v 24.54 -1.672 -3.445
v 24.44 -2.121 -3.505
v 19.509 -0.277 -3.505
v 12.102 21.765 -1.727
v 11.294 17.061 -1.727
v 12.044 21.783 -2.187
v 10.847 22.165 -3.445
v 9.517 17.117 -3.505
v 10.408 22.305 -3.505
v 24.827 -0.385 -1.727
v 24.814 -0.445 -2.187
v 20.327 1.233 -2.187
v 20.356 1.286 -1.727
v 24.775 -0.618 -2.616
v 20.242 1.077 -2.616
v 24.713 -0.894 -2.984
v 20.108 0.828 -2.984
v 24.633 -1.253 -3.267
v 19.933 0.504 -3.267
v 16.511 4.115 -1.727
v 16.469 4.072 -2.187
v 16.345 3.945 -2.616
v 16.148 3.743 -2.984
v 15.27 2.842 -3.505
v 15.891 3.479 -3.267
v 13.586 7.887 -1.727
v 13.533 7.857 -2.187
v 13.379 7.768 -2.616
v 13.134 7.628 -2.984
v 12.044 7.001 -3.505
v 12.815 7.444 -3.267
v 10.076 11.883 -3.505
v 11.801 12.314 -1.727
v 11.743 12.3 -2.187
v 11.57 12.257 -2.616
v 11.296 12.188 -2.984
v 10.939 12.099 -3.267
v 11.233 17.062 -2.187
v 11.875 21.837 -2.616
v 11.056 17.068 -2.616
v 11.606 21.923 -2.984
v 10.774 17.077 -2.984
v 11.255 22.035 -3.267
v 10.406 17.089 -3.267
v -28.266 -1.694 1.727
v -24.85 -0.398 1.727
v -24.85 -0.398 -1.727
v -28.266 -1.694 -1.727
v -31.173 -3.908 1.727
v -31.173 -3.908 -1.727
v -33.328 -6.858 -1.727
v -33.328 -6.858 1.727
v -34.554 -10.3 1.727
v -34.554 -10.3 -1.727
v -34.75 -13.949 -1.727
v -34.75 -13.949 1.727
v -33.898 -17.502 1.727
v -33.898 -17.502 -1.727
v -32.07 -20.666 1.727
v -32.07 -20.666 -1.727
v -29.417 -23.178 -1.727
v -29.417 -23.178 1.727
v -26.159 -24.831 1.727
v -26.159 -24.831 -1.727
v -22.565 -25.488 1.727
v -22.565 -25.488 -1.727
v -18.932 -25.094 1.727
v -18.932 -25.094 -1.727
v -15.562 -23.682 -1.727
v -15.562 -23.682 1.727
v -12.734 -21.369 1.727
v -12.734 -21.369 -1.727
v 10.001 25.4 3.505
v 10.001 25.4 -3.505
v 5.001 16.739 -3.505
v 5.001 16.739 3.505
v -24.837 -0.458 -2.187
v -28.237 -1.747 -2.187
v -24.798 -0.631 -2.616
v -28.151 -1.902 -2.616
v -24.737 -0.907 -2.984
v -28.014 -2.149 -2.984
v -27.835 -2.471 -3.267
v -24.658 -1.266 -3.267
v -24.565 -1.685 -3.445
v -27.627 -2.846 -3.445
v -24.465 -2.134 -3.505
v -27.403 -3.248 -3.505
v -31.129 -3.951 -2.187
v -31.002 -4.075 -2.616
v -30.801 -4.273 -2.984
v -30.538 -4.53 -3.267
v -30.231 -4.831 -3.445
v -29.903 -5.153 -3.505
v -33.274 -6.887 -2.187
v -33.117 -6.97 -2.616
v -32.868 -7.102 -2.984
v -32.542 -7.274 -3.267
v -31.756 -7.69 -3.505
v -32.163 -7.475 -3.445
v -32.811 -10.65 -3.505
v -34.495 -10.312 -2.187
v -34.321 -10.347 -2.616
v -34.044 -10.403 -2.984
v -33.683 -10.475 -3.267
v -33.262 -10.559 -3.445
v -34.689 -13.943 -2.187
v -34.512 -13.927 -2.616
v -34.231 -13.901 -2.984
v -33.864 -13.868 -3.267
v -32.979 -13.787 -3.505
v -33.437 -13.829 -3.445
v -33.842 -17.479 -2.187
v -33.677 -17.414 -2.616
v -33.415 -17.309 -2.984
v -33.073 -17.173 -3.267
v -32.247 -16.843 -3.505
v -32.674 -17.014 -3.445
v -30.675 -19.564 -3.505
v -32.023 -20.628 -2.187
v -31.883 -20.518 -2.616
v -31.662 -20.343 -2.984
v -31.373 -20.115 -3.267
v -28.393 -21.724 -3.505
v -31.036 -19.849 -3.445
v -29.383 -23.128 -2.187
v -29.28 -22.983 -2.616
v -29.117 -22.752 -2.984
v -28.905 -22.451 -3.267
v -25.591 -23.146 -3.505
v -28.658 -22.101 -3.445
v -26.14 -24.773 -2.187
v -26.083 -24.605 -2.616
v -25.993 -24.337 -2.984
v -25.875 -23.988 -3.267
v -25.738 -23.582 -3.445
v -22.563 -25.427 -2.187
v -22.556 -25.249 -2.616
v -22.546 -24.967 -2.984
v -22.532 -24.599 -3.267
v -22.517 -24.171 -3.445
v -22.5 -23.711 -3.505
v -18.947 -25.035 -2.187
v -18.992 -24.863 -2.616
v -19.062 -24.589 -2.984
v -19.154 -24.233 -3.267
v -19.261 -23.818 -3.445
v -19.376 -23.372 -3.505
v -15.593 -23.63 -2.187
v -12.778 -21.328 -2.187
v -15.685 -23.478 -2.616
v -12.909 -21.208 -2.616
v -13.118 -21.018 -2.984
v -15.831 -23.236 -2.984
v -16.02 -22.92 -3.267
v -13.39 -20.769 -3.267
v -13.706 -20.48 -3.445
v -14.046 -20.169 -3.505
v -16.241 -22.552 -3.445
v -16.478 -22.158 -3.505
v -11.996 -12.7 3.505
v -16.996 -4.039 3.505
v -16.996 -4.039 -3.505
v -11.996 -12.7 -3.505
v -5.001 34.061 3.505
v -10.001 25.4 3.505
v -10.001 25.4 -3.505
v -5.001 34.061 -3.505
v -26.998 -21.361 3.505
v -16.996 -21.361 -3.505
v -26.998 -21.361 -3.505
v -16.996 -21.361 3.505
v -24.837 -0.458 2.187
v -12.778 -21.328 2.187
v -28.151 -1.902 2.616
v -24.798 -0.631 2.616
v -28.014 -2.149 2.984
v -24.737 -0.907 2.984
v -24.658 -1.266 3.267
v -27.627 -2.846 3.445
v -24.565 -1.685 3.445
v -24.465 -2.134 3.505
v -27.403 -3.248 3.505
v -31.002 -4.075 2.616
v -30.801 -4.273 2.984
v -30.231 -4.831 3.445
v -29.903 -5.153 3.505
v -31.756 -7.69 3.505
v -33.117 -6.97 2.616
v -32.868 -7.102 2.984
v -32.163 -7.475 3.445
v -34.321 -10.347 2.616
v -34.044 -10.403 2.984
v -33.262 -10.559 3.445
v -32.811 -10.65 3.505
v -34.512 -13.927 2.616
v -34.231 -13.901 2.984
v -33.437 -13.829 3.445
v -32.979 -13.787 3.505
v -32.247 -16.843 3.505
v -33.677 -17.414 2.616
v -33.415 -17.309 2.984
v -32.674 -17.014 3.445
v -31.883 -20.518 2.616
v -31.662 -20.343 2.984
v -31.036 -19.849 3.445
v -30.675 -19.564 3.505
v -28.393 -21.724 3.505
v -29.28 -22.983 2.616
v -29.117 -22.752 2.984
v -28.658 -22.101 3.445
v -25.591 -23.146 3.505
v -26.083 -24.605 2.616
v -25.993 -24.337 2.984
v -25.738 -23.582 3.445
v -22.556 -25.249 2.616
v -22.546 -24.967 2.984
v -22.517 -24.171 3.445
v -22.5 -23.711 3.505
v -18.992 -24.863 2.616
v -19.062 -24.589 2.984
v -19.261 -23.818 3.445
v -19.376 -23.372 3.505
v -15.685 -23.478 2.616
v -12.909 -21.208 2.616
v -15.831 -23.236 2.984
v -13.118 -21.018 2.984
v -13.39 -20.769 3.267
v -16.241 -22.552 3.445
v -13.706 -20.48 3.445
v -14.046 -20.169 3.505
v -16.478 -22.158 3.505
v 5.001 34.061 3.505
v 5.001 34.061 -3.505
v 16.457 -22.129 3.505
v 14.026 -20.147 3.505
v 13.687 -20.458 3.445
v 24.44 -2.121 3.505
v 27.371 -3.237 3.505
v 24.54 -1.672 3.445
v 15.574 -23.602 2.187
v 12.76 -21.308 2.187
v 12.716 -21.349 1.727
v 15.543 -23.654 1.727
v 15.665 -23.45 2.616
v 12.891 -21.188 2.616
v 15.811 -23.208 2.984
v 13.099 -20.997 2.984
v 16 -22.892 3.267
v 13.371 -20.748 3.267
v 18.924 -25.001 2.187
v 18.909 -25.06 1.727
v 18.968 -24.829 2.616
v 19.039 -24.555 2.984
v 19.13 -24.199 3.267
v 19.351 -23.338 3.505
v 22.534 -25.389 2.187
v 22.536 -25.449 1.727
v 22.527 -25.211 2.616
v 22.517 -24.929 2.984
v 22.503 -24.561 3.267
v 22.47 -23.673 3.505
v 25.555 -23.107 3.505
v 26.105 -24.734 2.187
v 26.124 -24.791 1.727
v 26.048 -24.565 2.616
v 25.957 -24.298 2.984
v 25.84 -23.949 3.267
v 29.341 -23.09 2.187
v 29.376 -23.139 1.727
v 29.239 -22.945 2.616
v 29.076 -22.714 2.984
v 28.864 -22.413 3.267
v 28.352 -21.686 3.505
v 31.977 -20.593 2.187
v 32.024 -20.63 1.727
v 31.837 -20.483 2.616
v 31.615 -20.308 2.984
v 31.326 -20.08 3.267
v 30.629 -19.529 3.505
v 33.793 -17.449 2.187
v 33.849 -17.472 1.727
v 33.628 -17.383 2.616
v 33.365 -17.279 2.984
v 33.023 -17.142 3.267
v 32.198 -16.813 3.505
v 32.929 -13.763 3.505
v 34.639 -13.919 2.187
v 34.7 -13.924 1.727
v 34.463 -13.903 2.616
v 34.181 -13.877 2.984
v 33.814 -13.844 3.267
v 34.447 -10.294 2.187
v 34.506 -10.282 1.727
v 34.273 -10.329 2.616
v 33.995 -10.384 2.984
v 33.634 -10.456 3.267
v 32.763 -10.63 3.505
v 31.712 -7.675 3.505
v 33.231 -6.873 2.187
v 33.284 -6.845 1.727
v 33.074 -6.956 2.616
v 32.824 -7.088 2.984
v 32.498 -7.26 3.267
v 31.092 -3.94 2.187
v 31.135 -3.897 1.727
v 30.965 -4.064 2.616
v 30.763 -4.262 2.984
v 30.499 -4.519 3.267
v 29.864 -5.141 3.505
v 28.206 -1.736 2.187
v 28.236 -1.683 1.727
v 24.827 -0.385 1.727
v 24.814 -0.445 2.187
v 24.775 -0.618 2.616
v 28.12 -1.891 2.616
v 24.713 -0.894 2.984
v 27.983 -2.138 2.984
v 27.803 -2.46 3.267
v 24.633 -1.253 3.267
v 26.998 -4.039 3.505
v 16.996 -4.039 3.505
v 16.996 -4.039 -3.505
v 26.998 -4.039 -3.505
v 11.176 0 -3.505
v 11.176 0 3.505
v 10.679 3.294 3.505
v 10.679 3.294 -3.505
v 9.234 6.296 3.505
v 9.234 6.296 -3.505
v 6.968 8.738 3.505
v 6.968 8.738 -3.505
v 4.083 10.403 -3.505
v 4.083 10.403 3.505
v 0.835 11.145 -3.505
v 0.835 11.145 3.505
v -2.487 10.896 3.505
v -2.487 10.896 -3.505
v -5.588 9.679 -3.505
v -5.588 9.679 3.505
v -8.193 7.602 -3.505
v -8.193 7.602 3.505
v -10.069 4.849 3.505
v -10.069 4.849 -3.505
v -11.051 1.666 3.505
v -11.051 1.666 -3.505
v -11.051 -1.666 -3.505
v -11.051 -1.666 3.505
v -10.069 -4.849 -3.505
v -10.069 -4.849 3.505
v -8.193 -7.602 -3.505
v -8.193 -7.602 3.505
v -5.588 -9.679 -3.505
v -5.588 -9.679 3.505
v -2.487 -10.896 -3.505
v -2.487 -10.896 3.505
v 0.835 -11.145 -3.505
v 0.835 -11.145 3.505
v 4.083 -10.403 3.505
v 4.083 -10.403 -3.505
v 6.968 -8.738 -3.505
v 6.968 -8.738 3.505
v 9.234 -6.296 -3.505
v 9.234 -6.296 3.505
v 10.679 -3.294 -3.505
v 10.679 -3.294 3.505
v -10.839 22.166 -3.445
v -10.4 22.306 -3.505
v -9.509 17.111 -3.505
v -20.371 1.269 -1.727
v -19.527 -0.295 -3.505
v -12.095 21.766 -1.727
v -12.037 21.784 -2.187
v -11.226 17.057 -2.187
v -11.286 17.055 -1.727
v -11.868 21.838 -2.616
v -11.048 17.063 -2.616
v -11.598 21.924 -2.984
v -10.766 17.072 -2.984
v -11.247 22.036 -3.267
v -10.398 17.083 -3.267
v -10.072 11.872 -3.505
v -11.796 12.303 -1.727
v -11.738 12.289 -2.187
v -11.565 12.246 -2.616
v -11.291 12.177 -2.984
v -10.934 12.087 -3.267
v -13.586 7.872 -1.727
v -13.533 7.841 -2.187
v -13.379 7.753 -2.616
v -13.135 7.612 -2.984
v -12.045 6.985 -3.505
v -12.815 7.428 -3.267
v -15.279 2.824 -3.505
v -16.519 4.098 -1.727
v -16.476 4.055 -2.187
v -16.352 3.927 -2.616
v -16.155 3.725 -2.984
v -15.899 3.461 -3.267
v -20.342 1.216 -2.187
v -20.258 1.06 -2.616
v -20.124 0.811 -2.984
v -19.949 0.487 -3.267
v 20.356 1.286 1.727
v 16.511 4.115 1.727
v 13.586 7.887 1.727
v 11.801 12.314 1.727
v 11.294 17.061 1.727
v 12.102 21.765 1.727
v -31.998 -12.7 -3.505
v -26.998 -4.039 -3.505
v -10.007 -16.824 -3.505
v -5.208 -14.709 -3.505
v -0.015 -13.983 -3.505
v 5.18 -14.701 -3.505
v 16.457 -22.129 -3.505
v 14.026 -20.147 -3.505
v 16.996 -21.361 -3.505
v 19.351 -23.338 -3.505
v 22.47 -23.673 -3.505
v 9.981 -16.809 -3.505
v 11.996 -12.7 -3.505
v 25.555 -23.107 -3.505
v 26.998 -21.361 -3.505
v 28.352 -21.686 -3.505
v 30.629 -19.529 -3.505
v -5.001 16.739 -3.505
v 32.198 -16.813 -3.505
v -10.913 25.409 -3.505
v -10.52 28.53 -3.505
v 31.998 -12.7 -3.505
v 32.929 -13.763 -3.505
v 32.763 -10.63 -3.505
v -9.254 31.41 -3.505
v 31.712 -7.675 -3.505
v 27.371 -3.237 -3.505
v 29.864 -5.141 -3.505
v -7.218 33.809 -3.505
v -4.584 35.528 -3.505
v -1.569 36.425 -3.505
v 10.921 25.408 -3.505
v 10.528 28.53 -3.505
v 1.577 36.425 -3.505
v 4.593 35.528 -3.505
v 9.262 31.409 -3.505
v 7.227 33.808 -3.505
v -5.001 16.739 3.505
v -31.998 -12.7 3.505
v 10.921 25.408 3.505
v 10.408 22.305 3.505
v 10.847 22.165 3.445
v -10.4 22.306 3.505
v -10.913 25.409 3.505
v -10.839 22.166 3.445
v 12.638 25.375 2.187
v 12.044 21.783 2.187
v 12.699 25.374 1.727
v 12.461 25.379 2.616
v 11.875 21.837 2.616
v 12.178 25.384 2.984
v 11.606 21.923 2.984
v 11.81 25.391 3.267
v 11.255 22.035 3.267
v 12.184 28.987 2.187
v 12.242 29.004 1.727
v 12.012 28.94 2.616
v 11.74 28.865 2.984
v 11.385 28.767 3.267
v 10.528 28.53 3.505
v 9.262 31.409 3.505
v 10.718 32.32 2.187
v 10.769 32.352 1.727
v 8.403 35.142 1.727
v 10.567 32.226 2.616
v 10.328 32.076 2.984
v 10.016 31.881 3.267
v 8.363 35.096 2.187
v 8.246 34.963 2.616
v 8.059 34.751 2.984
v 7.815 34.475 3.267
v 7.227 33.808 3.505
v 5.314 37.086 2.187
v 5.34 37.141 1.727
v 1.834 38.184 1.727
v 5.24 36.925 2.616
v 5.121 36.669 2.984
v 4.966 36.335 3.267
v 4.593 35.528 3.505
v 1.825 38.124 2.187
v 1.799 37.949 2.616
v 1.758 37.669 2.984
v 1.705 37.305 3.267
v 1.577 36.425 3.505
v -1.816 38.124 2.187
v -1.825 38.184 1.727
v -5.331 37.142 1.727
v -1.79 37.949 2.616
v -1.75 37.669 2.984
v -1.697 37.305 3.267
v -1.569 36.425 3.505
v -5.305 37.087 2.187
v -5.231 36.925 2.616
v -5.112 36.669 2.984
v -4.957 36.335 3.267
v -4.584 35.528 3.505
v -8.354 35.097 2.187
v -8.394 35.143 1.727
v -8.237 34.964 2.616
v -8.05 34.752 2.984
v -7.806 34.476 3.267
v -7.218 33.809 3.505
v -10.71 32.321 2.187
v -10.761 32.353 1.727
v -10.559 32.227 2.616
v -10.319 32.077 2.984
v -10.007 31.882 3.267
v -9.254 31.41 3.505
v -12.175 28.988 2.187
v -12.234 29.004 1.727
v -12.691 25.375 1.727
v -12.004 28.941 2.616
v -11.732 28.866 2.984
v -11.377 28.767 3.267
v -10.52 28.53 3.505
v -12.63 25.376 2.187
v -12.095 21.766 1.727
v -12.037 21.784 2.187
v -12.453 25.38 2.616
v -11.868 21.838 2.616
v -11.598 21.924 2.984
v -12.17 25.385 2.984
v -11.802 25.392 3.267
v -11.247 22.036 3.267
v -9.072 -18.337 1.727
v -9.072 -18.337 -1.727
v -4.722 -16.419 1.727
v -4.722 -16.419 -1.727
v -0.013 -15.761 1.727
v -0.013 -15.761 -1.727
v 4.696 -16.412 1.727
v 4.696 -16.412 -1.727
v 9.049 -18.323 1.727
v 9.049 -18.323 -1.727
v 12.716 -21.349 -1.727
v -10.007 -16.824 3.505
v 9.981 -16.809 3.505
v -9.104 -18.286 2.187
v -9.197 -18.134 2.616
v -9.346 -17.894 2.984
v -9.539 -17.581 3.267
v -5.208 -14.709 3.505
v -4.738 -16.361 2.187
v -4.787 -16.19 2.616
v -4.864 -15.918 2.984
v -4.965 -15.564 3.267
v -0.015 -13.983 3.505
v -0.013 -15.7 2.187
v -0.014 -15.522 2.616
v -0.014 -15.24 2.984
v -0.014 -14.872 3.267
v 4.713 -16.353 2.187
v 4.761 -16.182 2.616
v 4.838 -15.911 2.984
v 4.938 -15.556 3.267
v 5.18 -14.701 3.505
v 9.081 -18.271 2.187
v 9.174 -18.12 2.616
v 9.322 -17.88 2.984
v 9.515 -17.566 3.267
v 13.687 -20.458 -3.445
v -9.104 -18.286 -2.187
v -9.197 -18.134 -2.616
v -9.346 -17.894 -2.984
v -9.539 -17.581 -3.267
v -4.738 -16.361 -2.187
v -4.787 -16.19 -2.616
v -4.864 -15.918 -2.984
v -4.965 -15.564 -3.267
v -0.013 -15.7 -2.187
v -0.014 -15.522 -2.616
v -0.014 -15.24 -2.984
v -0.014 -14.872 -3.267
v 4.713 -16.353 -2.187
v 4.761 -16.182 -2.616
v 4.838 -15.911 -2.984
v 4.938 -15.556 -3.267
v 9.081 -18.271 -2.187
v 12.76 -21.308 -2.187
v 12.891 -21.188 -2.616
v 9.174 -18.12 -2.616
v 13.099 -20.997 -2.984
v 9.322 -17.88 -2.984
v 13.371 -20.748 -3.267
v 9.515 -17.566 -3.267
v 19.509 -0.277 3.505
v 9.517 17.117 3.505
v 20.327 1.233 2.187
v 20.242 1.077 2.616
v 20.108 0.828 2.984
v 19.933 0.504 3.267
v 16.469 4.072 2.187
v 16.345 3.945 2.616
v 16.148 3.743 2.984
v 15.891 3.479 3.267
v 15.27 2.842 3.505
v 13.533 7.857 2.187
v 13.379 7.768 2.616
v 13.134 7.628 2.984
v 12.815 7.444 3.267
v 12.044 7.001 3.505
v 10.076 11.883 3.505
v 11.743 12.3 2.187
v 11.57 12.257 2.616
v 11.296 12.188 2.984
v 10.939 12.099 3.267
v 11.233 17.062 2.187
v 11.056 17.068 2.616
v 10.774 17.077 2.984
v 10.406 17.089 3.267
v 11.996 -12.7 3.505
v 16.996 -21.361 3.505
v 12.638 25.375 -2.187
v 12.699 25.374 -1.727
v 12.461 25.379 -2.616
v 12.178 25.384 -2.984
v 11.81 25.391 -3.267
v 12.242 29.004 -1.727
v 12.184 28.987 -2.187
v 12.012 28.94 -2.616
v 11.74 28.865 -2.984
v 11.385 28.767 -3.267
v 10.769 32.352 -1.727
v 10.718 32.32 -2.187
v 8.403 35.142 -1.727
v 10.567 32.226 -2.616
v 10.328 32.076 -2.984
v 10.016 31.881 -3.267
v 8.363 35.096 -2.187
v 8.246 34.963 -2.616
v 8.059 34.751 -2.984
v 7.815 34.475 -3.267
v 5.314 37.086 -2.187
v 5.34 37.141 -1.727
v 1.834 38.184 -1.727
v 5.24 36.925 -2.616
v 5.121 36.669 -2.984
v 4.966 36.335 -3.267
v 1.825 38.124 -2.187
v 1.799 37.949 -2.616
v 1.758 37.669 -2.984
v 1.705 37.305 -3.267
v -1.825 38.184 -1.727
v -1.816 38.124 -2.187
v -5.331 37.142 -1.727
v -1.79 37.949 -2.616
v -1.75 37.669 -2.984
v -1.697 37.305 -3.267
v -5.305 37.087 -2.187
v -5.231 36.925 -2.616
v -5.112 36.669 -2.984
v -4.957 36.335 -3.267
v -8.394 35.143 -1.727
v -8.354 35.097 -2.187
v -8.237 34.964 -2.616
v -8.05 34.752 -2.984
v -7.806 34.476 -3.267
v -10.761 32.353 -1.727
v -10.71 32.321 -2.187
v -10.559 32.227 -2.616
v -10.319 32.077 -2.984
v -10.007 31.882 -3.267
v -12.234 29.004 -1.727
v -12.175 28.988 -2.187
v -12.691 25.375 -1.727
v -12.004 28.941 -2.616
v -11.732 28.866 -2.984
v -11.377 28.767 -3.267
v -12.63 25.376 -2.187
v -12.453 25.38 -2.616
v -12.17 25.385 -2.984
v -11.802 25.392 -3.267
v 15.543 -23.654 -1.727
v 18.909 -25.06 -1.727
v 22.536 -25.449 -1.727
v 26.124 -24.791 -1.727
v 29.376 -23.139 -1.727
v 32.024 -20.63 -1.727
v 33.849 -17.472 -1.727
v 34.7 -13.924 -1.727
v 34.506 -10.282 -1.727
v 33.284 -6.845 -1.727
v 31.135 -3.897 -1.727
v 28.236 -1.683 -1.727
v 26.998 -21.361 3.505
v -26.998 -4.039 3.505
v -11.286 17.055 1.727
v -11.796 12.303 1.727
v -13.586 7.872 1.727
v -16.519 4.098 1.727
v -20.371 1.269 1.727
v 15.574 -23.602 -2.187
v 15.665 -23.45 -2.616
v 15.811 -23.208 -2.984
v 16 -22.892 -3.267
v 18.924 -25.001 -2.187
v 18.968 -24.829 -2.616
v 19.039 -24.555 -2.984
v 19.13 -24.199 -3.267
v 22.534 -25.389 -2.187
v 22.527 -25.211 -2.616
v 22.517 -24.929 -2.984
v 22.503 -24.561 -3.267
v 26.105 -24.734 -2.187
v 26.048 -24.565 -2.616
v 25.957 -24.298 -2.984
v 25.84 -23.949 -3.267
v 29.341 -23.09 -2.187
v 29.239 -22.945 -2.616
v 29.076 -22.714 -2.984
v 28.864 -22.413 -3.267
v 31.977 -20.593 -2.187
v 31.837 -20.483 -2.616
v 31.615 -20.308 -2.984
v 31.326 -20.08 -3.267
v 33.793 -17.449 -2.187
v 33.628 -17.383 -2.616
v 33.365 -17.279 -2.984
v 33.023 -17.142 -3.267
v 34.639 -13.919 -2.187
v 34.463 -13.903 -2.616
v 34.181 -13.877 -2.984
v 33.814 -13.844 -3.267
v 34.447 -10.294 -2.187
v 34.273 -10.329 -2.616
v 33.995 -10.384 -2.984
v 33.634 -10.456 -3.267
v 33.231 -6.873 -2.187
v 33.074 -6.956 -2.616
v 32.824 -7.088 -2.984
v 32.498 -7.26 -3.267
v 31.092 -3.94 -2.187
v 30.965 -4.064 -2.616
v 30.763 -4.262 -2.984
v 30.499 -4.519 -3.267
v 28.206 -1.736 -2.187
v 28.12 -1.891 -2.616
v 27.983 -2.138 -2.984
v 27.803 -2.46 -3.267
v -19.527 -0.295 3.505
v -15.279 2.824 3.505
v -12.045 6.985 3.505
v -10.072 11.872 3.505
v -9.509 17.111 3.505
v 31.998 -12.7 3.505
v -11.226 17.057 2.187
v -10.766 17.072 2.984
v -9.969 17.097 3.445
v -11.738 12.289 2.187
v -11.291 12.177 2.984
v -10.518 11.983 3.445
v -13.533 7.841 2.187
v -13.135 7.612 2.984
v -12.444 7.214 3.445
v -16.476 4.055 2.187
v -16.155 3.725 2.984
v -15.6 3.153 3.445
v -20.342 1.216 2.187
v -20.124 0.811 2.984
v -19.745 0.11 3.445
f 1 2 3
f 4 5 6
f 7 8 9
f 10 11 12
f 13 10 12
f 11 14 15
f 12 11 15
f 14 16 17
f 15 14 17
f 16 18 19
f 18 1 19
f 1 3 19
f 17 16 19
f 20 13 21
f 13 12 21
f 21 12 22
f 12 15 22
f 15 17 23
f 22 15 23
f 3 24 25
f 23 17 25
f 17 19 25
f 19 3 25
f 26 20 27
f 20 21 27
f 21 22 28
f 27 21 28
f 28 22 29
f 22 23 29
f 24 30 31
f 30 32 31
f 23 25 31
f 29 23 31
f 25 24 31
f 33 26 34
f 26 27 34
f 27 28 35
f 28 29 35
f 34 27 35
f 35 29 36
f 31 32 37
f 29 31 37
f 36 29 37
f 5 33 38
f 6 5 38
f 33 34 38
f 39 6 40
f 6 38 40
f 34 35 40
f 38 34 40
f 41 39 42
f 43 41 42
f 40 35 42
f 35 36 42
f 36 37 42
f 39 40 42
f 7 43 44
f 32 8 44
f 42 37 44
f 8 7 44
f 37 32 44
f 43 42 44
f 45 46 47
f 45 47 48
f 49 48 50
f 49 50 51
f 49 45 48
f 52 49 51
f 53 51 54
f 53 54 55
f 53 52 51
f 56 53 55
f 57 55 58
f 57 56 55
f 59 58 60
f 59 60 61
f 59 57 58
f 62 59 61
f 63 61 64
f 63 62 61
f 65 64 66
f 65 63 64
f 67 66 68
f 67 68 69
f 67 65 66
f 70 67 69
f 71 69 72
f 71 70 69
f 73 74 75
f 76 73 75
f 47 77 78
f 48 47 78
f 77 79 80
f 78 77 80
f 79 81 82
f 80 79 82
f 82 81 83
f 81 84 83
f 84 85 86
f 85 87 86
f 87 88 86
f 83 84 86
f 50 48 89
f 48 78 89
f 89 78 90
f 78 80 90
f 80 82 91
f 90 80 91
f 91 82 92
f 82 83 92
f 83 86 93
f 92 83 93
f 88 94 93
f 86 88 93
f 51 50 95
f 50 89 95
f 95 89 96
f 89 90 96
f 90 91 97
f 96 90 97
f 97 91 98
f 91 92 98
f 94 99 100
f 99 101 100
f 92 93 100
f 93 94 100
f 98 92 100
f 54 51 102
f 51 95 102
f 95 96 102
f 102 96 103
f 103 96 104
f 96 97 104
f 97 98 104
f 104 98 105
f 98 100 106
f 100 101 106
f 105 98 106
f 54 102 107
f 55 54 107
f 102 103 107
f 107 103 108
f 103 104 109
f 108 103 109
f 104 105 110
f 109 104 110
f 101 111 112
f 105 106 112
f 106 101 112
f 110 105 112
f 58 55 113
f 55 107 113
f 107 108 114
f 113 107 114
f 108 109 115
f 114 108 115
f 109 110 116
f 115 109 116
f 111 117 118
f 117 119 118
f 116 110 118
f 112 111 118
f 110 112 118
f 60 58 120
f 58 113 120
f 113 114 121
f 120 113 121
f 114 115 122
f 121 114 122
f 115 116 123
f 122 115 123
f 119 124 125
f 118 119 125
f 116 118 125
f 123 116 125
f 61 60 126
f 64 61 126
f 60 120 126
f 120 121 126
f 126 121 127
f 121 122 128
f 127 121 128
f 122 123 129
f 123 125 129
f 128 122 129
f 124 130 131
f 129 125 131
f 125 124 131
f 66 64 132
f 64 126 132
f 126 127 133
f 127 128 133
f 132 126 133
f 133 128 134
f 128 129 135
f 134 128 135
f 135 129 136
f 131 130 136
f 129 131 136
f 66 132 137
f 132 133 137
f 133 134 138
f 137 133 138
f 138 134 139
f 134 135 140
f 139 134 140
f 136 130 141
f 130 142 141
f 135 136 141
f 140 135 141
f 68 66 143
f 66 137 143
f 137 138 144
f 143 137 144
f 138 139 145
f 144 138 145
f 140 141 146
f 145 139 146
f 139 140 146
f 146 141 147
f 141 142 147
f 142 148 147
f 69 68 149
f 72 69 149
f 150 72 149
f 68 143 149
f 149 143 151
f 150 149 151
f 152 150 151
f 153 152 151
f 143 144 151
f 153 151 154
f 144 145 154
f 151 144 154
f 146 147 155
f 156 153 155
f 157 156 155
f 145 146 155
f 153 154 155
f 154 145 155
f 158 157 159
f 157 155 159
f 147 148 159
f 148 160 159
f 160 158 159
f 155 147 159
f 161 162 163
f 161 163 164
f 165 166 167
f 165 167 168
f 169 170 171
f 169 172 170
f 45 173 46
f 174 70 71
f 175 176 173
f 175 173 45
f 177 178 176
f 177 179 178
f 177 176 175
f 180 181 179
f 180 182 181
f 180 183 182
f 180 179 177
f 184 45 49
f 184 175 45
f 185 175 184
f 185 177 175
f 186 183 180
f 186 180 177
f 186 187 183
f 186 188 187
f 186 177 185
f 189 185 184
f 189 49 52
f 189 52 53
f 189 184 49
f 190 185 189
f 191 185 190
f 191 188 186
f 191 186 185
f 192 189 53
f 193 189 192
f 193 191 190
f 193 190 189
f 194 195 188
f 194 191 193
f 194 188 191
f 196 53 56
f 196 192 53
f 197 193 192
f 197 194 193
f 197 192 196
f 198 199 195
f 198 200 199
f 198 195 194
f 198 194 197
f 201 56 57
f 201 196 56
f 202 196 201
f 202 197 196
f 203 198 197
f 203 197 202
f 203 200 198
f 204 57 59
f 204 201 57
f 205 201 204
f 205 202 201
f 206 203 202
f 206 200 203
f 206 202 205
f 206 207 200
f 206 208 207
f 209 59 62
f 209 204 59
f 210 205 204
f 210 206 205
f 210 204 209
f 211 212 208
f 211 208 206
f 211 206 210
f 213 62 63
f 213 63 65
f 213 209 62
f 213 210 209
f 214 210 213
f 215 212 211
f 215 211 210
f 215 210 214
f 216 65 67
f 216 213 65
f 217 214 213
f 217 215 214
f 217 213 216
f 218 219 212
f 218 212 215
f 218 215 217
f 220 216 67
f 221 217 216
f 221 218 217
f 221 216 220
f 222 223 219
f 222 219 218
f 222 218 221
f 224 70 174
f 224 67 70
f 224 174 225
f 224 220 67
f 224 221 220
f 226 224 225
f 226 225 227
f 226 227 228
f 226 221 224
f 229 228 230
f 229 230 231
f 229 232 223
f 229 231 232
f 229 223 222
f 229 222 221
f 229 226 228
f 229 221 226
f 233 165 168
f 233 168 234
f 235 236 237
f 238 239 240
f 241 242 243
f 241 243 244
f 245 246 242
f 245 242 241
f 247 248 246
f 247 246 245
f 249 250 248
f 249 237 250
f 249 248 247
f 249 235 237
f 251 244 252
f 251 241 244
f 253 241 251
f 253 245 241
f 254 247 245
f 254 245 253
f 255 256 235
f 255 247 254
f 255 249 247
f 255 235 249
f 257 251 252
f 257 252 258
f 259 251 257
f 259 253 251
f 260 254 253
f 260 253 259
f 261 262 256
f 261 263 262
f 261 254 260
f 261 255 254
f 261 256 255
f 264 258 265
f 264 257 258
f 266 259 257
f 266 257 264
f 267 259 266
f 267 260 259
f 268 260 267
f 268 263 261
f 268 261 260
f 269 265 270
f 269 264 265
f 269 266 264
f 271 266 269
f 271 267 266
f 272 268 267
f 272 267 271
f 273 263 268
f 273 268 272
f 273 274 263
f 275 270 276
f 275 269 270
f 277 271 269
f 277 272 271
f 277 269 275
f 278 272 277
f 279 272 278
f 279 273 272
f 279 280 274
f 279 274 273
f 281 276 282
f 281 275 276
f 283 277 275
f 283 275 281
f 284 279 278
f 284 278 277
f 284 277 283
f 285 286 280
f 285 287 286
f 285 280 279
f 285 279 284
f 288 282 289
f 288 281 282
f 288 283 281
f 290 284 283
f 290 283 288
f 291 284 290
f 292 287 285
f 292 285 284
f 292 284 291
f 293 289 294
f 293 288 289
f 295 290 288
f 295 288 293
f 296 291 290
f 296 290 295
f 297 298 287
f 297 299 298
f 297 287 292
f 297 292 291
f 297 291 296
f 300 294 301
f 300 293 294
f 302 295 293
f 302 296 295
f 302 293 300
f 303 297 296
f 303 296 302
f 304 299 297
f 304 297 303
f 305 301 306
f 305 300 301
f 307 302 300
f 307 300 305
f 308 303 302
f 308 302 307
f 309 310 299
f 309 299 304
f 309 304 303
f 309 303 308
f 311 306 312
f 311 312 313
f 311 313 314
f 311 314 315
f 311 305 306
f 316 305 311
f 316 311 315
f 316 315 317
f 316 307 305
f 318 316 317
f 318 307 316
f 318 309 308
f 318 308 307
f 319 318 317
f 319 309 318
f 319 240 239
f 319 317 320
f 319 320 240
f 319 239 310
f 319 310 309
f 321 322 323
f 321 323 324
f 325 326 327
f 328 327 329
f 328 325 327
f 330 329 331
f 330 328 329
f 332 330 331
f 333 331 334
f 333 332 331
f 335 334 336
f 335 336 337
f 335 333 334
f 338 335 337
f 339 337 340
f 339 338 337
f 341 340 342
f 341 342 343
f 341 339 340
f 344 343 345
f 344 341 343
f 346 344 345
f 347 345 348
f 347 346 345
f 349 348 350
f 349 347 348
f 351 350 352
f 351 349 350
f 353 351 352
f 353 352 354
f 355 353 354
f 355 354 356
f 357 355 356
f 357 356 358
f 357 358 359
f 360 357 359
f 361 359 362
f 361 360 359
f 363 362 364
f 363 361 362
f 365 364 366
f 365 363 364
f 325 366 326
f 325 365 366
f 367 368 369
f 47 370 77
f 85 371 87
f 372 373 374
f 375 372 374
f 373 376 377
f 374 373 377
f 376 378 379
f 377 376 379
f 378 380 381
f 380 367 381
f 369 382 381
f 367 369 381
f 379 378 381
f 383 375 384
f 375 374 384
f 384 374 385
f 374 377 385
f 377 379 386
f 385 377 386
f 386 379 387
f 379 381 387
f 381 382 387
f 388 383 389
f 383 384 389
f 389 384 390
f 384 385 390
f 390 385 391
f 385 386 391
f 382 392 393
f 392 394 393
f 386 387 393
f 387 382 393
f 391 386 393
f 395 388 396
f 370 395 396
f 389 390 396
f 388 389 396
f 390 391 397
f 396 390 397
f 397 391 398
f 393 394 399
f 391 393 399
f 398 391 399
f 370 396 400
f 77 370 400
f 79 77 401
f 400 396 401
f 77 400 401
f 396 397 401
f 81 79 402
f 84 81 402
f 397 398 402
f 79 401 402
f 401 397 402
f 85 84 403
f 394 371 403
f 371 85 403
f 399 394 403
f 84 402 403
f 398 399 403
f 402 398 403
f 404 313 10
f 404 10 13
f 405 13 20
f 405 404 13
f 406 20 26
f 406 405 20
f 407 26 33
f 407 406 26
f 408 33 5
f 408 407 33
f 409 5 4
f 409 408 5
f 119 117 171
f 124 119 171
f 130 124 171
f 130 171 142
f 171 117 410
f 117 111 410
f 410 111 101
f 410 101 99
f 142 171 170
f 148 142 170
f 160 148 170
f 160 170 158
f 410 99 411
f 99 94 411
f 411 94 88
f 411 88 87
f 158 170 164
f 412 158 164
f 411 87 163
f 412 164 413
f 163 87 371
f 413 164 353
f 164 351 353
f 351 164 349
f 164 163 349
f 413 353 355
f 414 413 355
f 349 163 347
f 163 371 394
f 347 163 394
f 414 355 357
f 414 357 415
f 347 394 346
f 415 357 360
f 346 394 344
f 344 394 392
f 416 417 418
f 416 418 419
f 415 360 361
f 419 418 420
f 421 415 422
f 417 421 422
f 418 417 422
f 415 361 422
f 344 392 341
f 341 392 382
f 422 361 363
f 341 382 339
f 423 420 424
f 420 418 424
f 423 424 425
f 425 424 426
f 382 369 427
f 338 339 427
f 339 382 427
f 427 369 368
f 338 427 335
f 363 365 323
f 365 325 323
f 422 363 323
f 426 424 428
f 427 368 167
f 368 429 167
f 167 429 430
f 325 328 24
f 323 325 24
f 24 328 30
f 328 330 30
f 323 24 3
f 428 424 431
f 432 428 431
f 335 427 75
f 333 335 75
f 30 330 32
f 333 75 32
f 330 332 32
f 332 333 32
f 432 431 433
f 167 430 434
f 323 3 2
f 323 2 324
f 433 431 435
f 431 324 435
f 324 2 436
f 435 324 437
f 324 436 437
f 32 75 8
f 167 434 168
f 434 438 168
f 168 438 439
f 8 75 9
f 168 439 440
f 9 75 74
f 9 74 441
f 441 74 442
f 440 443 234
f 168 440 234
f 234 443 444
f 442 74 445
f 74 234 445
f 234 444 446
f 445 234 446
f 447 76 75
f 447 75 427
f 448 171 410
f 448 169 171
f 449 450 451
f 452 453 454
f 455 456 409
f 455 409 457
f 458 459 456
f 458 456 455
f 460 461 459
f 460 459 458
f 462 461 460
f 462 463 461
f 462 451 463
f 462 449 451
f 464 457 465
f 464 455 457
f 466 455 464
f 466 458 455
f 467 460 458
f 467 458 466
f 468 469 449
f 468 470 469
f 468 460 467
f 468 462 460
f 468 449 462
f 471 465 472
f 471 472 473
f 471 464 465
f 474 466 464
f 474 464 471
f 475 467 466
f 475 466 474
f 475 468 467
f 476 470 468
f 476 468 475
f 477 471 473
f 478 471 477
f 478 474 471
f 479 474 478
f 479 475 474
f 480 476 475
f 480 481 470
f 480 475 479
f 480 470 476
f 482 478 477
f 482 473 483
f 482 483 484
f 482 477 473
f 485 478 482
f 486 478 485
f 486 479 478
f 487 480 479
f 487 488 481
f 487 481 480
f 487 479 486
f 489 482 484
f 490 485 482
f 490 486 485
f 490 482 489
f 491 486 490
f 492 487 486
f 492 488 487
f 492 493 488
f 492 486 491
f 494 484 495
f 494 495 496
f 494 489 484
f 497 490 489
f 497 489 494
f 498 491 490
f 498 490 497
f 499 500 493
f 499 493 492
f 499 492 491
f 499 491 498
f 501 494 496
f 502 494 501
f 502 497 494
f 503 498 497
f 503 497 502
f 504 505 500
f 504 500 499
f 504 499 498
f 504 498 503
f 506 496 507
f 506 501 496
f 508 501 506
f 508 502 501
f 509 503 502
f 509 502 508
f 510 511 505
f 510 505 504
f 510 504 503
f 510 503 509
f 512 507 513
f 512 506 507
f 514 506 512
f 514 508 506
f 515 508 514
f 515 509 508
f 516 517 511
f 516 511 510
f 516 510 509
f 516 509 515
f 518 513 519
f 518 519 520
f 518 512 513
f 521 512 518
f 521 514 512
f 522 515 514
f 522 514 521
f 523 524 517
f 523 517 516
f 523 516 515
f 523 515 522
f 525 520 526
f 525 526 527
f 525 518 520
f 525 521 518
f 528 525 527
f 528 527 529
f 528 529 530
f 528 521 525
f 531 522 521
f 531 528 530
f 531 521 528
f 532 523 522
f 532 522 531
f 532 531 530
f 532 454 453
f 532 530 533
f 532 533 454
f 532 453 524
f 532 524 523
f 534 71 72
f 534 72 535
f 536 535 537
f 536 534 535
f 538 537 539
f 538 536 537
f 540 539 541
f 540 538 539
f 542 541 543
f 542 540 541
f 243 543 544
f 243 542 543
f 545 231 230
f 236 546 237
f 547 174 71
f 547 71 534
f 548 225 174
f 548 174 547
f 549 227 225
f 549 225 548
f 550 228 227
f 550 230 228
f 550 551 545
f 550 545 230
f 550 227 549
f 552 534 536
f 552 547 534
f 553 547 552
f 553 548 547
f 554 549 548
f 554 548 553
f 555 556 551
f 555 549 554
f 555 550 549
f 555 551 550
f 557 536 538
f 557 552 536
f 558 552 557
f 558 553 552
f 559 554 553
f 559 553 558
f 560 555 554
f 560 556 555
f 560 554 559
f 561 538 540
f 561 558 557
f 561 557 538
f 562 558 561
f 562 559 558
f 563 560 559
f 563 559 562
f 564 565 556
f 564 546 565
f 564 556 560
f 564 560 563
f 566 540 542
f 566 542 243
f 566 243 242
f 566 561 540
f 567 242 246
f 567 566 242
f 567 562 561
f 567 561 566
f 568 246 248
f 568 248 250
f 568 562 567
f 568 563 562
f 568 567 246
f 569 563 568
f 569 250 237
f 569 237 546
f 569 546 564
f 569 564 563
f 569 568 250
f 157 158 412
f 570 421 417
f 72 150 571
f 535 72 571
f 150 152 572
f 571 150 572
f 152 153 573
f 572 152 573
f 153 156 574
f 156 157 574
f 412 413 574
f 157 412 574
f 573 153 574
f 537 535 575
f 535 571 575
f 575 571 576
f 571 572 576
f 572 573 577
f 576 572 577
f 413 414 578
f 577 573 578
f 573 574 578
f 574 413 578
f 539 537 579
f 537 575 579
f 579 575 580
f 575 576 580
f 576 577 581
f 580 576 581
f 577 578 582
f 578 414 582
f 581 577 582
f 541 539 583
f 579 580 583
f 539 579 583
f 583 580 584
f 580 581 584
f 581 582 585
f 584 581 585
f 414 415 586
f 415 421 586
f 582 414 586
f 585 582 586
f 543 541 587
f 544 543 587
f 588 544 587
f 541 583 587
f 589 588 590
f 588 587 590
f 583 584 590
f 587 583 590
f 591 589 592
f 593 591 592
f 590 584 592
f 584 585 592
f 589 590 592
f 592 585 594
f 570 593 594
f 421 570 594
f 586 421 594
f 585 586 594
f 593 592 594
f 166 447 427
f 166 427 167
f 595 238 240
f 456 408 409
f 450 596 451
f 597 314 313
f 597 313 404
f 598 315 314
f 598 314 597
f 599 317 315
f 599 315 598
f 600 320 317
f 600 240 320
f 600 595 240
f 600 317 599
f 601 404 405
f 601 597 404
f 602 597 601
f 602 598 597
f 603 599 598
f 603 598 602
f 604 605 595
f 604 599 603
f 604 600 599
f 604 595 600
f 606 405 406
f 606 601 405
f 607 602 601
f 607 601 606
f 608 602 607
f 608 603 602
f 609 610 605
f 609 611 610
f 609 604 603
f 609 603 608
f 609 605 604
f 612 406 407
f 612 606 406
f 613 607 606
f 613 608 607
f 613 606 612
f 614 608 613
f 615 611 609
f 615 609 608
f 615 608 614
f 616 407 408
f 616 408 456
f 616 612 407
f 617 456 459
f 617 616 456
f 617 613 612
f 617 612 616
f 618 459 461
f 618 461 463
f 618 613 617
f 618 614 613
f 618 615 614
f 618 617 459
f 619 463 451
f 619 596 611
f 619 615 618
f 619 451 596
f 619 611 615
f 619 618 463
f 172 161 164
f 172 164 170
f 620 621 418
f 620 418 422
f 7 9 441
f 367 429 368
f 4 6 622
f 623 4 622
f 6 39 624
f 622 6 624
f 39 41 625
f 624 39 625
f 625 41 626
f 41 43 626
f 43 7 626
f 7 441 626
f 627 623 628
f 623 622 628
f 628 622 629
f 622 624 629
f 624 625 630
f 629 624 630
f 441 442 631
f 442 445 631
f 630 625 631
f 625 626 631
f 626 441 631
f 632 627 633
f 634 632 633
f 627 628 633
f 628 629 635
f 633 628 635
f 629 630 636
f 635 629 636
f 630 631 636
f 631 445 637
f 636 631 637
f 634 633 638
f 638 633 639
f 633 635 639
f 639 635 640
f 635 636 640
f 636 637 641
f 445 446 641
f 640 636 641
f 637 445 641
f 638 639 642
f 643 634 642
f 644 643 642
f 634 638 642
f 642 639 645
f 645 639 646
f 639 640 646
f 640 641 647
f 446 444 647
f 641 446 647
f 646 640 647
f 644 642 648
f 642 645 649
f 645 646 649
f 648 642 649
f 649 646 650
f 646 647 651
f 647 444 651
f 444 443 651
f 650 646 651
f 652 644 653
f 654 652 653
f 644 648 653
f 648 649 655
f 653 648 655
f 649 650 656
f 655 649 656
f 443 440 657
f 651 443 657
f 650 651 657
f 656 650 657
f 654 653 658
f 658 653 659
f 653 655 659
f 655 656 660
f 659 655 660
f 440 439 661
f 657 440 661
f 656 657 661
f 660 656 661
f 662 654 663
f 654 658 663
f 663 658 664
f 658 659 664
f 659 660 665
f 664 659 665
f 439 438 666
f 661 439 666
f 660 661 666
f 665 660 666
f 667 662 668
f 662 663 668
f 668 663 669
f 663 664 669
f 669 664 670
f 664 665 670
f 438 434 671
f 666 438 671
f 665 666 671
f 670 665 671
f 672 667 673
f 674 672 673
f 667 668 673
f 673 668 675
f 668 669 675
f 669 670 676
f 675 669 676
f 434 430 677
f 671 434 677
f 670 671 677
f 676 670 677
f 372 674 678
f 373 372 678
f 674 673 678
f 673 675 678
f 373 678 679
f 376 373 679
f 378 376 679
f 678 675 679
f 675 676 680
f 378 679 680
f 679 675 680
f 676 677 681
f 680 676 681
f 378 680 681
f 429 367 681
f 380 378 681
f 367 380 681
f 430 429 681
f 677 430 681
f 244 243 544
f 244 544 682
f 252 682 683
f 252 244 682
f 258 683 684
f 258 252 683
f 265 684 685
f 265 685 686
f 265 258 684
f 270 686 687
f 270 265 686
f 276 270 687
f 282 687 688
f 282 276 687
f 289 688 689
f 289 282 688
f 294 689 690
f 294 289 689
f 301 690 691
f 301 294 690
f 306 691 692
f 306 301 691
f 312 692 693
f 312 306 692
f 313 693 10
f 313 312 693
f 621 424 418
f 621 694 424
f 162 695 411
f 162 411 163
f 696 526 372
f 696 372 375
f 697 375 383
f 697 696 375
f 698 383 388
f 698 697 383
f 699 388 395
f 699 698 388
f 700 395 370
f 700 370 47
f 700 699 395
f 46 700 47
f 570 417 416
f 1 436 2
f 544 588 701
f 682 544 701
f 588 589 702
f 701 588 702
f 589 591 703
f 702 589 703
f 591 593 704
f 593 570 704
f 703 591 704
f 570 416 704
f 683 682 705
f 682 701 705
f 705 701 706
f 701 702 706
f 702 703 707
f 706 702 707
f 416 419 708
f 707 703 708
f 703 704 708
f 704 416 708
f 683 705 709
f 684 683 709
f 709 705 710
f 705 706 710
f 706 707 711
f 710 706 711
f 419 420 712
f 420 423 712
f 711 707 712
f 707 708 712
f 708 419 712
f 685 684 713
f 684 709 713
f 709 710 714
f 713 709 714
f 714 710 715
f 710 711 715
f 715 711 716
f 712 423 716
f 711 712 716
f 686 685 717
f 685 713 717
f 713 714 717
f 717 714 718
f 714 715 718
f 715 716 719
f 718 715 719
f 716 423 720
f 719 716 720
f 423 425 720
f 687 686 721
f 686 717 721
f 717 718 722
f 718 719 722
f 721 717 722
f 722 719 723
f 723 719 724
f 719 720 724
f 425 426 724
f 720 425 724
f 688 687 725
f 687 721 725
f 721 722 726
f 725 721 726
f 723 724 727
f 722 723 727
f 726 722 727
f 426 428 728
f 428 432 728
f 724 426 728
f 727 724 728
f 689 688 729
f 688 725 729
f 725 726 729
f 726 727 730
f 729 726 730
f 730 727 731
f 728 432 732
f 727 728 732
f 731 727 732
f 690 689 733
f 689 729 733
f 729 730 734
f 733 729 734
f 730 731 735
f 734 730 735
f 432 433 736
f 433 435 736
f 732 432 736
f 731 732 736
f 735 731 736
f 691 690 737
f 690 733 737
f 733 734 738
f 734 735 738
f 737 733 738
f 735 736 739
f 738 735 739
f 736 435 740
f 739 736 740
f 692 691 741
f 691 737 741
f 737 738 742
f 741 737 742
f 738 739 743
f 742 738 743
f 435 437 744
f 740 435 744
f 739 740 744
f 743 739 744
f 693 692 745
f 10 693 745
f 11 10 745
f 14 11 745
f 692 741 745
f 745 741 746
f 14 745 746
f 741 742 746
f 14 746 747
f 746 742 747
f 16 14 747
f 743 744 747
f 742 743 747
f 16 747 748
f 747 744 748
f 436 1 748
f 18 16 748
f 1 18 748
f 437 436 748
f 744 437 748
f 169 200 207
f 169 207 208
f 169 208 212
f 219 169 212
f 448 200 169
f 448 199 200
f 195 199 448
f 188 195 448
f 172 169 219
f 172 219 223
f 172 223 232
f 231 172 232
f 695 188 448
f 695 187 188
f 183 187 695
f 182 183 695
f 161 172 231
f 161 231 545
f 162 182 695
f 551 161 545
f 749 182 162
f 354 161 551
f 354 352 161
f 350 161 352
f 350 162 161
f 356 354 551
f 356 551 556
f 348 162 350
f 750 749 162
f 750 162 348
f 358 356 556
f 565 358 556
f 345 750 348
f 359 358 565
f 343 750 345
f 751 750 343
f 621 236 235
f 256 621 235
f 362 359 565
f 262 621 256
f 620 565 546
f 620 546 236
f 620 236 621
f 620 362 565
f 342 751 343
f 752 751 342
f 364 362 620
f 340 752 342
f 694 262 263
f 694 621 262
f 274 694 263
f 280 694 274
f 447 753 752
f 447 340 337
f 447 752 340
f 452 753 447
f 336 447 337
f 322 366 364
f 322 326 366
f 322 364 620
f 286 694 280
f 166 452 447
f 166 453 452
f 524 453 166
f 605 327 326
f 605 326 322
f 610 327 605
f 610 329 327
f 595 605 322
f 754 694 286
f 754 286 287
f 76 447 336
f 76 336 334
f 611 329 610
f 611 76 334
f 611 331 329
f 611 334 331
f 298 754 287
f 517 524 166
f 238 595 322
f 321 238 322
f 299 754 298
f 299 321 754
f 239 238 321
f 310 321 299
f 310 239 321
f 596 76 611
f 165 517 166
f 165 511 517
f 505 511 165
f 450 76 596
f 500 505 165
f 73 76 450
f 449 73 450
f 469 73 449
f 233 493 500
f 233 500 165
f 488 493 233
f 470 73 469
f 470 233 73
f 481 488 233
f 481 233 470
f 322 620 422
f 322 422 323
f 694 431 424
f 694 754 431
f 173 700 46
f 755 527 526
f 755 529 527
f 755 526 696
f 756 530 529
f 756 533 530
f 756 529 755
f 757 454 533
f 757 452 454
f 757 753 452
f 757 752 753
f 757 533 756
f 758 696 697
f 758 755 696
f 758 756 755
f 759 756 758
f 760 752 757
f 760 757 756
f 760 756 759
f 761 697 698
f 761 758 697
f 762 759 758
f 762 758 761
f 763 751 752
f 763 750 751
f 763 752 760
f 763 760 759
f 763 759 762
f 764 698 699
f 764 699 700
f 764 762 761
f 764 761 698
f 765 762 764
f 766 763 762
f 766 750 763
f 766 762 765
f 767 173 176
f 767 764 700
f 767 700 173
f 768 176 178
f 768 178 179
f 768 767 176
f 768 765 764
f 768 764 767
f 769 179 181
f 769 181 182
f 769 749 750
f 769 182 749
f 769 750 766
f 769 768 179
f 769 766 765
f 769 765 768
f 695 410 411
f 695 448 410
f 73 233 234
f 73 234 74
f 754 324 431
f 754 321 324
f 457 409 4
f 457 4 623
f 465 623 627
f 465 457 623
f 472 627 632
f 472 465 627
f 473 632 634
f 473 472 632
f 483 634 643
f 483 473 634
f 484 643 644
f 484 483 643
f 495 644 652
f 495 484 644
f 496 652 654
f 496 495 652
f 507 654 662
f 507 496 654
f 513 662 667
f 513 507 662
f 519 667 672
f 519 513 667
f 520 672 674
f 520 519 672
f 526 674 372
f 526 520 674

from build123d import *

# Parameters (mm, degrees)
F0_R     = 11.176
F1_DEPTH = 3.5052
F2_R     = 1.778


with BuildPart() as f1:
    # F0 (on Top) → F1 (new body, symmetric)
    with BuildSketch(Plane.XY):
        with BuildLine():
            ThreePointArc((-24.84993, -0.398391), (-33.098704, -19.149794), (-12.733744, -21.369204))
            ThreePointArc((-12.733744, -21.369204), (-0.013391, -15.760536), (12.71565, -21.34946))
            ThreePointArc((12.71565, -21.34946), (33.05076, -19.116913), (24.826735, -0.385487))
            ThreePointArc((24.826735, -0.385487), (13.585768, 7.887112), (12.102172, 21.764941))
            ThreePointArc((12.102172, 21.764941), (0.004478, 38.316773), (-12.094544, 21.765913))
            ThreePointArc((-12.094544, 21.765913), (-13.5859, 7.871711), (-24.84993, -0.398391))
        make_face()
        Polygon((-26.997707, -4.0386), (-16.996384, -4.0386), (-11.995722, -12.7), (-16.996384, -21.3614), (-26.997707, -21.3614), (-31.998368, -12.7), align=None, mode=Mode.SUBTRACT)
        Polygon((16.996384, -21.3614), (11.995722, -12.7), (16.996384, -4.0386), (26.997707, -4.0386), (31.998368, -12.7), (26.997707, -21.3614), align=None, mode=Mode.SUBTRACT)
        Circle(F0_R, mode=Mode.SUBTRACT)
        Polygon((10.001323, 25.4), (5.000662, 16.7386), (-5.000662, 16.7386), (-10.001323, 25.4), (-5.000662, 34.0614), (5.000662, 34.0614), align=None, mode=Mode.SUBTRACT)
    extrude(amount=F1_DEPTH, both=True)

    # F2
    f2_edges = [f1.edges().sort_by_distance(p)[0] for p in [
        (-33.098704, -19.149794, 3.5052),
        (-0.013391, -15.760536, 3.5052),
        (-13.5859, 7.871711, 3.5052),
        (0.004478, 38.316773, 3.5052),
        (13.585768, 7.887112, 3.5052),
        (33.05076, -19.116913, 3.5052),
        (13.585768, 7.887112, -3.5052),
        (0.004478, 38.316773, -3.5052),
        (-13.5859, 7.871711, -3.5052),
        (-33.098704, -19.149794, -3.5052),
        (-0.013391, -15.760536, -3.5052),
        (33.05076, -19.116913, -3.5052),
    ]]
    fillet(f2_edges, radius=F2_R)


solid = f1.part
